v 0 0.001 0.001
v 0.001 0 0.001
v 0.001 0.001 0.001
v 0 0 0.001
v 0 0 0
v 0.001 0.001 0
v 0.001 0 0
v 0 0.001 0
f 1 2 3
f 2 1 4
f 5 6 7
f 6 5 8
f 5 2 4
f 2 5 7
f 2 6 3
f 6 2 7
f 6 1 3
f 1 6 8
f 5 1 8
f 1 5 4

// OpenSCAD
// t_polyline — the incumbent frontend and its three guards.
// The guards themselves ABORT, so they cannot be asserted from inside OpenSCAD:
// they are exercised by tests/guards/ via `just guards`.

use <../src/uniTube.scad>;

// --- the worked elbow lowers to L, A, L --------------------------------------
p = ut_polyline([[0, 0, 0], [50, 0, 0], [50, 50, 0]], r=15);
segs = ut_segs(p);
assert(len(segs) == 3, str("elbow should lower to 3 segments, got ", len(segs)));
assert(ut_seg_kind(segs[0]) == "L" && ut_seg_kind(segs[1]) == "A" && ut_seg_kind(segs[2]) == "L", "L, A, L");
assert(abs(ut_length(p) - 93.5619449019) < 1e-9, "exact developed length");

// The inset math: inset = r*tan(ang/2) = 15*tan(45) = 15, so the first leg is
// trimmed from 50 mm to 35 mm. docs/developer/history.md §1.
assert(abs(ut_seg_len(segs[0]) - 35) < 1e-9, str("leg trimmed by the tangent length, got ", ut_seg_len(segs[0])));
assert(norm(ut_seg_p1(segs[0]) - [35, 0, 0]) < 1e-9, "tangent point at 35 mm");

// The arc centre lies on the internal bisector at r/cos(ang/2) from the vertex.
assert(norm(segs[1][1] - [35, 15, 0]) < 1e-9, str("arc centre should be [35,15,0], got ", segs[1][1]));

// --- a straight run with no interior vertices --------------------------------
// BOSL2's round_corners hard-asserts on a 2-point path; ours must not, because a
// plain straight pipe is the trunk of every manifold.
straight = ut_polyline([[0, 0, 0], [40, 0, 0]]);
assert(len(ut_segs(straight)) == 1, "a 2-point path is one straight segment");
assert(abs(ut_length(straight) - 40) < 1e-9, "straight length");

// --- a scalar radius applies to INTERIOR vertices only -----------------------
sc = ut_polyline([[0, 0, 0], [50, 0, 0], [50, 50, 0], [0, 50, 0]], r=10);
assert(len([for (s = ut_segs(sc)) if (ut_seg_kind(s) == "A") 1]) == 2, "2 interior vertices -> 2 arcs");

// --- GUARD 2, benign half: a collinear waypoint MERGES rather than NaN --------
col = ut_polyline([[0, 0, 0], [25, 0, 0], [50, 0, 0], [50, 50, 0]], r=10);
assert(
    len([for (s = ut_segs(col)) if (ut_seg_kind(s) == "A") 1]) == 1,
    "a collinear waypoint must emit NO arc -- an arc there has a NaN centre"
);
assert(
    abs(ut_length(col) - ut_length(ut_polyline([[0, 0, 0], [50, 0, 0], [50, 50, 0]], r=10))) < 1e-9,
    "the collinear waypoint changes nothing about the geometry"
);

// --- exactly-tangent bends: the zero-length straight is omitted --------------
// This is not an error; it is an S-bend with no straight between the arcs.
tang = ut_polyline([[0, 0, 0], [100, 0, 0], [100, 100, 0], [0, 100, 0]], r=50);
assert(
    len([for (s = ut_segs(tang)) if (ut_seg_kind(s) == "L" && ut_seg_len(s) < 1e-9) 1]) == 0,
    "no degenerate zero-length straights are emitted"
);

// --- the legacy demo path lowers cleanly -------------------------------------
legacy = ut_polyline(
    [
        [0, 0, 0],
        [100, 0, 0],
        [100, 100, 0],
        [50, 100, 100],
        [50, 100, 150],
        [0, 100, 50],
        [0, 0, 0],
        [50, 0, 50],
    ],
    r=[70, 30, 30, 6, 50, 30]
);
assert(len(ut_segs(legacy)) == 12, str("legacy demo lowers to 12 segments, got ", len(ut_segs(legacy))));
assert(
    len([for (s = ut_segs(legacy)) if (ut_seg_kind(s) == "A") 1]) == 6,
    "all SIX bends must be present -- they have rendered as nothing since 2025-01-10"
);

cube(0.001); // sentinel
